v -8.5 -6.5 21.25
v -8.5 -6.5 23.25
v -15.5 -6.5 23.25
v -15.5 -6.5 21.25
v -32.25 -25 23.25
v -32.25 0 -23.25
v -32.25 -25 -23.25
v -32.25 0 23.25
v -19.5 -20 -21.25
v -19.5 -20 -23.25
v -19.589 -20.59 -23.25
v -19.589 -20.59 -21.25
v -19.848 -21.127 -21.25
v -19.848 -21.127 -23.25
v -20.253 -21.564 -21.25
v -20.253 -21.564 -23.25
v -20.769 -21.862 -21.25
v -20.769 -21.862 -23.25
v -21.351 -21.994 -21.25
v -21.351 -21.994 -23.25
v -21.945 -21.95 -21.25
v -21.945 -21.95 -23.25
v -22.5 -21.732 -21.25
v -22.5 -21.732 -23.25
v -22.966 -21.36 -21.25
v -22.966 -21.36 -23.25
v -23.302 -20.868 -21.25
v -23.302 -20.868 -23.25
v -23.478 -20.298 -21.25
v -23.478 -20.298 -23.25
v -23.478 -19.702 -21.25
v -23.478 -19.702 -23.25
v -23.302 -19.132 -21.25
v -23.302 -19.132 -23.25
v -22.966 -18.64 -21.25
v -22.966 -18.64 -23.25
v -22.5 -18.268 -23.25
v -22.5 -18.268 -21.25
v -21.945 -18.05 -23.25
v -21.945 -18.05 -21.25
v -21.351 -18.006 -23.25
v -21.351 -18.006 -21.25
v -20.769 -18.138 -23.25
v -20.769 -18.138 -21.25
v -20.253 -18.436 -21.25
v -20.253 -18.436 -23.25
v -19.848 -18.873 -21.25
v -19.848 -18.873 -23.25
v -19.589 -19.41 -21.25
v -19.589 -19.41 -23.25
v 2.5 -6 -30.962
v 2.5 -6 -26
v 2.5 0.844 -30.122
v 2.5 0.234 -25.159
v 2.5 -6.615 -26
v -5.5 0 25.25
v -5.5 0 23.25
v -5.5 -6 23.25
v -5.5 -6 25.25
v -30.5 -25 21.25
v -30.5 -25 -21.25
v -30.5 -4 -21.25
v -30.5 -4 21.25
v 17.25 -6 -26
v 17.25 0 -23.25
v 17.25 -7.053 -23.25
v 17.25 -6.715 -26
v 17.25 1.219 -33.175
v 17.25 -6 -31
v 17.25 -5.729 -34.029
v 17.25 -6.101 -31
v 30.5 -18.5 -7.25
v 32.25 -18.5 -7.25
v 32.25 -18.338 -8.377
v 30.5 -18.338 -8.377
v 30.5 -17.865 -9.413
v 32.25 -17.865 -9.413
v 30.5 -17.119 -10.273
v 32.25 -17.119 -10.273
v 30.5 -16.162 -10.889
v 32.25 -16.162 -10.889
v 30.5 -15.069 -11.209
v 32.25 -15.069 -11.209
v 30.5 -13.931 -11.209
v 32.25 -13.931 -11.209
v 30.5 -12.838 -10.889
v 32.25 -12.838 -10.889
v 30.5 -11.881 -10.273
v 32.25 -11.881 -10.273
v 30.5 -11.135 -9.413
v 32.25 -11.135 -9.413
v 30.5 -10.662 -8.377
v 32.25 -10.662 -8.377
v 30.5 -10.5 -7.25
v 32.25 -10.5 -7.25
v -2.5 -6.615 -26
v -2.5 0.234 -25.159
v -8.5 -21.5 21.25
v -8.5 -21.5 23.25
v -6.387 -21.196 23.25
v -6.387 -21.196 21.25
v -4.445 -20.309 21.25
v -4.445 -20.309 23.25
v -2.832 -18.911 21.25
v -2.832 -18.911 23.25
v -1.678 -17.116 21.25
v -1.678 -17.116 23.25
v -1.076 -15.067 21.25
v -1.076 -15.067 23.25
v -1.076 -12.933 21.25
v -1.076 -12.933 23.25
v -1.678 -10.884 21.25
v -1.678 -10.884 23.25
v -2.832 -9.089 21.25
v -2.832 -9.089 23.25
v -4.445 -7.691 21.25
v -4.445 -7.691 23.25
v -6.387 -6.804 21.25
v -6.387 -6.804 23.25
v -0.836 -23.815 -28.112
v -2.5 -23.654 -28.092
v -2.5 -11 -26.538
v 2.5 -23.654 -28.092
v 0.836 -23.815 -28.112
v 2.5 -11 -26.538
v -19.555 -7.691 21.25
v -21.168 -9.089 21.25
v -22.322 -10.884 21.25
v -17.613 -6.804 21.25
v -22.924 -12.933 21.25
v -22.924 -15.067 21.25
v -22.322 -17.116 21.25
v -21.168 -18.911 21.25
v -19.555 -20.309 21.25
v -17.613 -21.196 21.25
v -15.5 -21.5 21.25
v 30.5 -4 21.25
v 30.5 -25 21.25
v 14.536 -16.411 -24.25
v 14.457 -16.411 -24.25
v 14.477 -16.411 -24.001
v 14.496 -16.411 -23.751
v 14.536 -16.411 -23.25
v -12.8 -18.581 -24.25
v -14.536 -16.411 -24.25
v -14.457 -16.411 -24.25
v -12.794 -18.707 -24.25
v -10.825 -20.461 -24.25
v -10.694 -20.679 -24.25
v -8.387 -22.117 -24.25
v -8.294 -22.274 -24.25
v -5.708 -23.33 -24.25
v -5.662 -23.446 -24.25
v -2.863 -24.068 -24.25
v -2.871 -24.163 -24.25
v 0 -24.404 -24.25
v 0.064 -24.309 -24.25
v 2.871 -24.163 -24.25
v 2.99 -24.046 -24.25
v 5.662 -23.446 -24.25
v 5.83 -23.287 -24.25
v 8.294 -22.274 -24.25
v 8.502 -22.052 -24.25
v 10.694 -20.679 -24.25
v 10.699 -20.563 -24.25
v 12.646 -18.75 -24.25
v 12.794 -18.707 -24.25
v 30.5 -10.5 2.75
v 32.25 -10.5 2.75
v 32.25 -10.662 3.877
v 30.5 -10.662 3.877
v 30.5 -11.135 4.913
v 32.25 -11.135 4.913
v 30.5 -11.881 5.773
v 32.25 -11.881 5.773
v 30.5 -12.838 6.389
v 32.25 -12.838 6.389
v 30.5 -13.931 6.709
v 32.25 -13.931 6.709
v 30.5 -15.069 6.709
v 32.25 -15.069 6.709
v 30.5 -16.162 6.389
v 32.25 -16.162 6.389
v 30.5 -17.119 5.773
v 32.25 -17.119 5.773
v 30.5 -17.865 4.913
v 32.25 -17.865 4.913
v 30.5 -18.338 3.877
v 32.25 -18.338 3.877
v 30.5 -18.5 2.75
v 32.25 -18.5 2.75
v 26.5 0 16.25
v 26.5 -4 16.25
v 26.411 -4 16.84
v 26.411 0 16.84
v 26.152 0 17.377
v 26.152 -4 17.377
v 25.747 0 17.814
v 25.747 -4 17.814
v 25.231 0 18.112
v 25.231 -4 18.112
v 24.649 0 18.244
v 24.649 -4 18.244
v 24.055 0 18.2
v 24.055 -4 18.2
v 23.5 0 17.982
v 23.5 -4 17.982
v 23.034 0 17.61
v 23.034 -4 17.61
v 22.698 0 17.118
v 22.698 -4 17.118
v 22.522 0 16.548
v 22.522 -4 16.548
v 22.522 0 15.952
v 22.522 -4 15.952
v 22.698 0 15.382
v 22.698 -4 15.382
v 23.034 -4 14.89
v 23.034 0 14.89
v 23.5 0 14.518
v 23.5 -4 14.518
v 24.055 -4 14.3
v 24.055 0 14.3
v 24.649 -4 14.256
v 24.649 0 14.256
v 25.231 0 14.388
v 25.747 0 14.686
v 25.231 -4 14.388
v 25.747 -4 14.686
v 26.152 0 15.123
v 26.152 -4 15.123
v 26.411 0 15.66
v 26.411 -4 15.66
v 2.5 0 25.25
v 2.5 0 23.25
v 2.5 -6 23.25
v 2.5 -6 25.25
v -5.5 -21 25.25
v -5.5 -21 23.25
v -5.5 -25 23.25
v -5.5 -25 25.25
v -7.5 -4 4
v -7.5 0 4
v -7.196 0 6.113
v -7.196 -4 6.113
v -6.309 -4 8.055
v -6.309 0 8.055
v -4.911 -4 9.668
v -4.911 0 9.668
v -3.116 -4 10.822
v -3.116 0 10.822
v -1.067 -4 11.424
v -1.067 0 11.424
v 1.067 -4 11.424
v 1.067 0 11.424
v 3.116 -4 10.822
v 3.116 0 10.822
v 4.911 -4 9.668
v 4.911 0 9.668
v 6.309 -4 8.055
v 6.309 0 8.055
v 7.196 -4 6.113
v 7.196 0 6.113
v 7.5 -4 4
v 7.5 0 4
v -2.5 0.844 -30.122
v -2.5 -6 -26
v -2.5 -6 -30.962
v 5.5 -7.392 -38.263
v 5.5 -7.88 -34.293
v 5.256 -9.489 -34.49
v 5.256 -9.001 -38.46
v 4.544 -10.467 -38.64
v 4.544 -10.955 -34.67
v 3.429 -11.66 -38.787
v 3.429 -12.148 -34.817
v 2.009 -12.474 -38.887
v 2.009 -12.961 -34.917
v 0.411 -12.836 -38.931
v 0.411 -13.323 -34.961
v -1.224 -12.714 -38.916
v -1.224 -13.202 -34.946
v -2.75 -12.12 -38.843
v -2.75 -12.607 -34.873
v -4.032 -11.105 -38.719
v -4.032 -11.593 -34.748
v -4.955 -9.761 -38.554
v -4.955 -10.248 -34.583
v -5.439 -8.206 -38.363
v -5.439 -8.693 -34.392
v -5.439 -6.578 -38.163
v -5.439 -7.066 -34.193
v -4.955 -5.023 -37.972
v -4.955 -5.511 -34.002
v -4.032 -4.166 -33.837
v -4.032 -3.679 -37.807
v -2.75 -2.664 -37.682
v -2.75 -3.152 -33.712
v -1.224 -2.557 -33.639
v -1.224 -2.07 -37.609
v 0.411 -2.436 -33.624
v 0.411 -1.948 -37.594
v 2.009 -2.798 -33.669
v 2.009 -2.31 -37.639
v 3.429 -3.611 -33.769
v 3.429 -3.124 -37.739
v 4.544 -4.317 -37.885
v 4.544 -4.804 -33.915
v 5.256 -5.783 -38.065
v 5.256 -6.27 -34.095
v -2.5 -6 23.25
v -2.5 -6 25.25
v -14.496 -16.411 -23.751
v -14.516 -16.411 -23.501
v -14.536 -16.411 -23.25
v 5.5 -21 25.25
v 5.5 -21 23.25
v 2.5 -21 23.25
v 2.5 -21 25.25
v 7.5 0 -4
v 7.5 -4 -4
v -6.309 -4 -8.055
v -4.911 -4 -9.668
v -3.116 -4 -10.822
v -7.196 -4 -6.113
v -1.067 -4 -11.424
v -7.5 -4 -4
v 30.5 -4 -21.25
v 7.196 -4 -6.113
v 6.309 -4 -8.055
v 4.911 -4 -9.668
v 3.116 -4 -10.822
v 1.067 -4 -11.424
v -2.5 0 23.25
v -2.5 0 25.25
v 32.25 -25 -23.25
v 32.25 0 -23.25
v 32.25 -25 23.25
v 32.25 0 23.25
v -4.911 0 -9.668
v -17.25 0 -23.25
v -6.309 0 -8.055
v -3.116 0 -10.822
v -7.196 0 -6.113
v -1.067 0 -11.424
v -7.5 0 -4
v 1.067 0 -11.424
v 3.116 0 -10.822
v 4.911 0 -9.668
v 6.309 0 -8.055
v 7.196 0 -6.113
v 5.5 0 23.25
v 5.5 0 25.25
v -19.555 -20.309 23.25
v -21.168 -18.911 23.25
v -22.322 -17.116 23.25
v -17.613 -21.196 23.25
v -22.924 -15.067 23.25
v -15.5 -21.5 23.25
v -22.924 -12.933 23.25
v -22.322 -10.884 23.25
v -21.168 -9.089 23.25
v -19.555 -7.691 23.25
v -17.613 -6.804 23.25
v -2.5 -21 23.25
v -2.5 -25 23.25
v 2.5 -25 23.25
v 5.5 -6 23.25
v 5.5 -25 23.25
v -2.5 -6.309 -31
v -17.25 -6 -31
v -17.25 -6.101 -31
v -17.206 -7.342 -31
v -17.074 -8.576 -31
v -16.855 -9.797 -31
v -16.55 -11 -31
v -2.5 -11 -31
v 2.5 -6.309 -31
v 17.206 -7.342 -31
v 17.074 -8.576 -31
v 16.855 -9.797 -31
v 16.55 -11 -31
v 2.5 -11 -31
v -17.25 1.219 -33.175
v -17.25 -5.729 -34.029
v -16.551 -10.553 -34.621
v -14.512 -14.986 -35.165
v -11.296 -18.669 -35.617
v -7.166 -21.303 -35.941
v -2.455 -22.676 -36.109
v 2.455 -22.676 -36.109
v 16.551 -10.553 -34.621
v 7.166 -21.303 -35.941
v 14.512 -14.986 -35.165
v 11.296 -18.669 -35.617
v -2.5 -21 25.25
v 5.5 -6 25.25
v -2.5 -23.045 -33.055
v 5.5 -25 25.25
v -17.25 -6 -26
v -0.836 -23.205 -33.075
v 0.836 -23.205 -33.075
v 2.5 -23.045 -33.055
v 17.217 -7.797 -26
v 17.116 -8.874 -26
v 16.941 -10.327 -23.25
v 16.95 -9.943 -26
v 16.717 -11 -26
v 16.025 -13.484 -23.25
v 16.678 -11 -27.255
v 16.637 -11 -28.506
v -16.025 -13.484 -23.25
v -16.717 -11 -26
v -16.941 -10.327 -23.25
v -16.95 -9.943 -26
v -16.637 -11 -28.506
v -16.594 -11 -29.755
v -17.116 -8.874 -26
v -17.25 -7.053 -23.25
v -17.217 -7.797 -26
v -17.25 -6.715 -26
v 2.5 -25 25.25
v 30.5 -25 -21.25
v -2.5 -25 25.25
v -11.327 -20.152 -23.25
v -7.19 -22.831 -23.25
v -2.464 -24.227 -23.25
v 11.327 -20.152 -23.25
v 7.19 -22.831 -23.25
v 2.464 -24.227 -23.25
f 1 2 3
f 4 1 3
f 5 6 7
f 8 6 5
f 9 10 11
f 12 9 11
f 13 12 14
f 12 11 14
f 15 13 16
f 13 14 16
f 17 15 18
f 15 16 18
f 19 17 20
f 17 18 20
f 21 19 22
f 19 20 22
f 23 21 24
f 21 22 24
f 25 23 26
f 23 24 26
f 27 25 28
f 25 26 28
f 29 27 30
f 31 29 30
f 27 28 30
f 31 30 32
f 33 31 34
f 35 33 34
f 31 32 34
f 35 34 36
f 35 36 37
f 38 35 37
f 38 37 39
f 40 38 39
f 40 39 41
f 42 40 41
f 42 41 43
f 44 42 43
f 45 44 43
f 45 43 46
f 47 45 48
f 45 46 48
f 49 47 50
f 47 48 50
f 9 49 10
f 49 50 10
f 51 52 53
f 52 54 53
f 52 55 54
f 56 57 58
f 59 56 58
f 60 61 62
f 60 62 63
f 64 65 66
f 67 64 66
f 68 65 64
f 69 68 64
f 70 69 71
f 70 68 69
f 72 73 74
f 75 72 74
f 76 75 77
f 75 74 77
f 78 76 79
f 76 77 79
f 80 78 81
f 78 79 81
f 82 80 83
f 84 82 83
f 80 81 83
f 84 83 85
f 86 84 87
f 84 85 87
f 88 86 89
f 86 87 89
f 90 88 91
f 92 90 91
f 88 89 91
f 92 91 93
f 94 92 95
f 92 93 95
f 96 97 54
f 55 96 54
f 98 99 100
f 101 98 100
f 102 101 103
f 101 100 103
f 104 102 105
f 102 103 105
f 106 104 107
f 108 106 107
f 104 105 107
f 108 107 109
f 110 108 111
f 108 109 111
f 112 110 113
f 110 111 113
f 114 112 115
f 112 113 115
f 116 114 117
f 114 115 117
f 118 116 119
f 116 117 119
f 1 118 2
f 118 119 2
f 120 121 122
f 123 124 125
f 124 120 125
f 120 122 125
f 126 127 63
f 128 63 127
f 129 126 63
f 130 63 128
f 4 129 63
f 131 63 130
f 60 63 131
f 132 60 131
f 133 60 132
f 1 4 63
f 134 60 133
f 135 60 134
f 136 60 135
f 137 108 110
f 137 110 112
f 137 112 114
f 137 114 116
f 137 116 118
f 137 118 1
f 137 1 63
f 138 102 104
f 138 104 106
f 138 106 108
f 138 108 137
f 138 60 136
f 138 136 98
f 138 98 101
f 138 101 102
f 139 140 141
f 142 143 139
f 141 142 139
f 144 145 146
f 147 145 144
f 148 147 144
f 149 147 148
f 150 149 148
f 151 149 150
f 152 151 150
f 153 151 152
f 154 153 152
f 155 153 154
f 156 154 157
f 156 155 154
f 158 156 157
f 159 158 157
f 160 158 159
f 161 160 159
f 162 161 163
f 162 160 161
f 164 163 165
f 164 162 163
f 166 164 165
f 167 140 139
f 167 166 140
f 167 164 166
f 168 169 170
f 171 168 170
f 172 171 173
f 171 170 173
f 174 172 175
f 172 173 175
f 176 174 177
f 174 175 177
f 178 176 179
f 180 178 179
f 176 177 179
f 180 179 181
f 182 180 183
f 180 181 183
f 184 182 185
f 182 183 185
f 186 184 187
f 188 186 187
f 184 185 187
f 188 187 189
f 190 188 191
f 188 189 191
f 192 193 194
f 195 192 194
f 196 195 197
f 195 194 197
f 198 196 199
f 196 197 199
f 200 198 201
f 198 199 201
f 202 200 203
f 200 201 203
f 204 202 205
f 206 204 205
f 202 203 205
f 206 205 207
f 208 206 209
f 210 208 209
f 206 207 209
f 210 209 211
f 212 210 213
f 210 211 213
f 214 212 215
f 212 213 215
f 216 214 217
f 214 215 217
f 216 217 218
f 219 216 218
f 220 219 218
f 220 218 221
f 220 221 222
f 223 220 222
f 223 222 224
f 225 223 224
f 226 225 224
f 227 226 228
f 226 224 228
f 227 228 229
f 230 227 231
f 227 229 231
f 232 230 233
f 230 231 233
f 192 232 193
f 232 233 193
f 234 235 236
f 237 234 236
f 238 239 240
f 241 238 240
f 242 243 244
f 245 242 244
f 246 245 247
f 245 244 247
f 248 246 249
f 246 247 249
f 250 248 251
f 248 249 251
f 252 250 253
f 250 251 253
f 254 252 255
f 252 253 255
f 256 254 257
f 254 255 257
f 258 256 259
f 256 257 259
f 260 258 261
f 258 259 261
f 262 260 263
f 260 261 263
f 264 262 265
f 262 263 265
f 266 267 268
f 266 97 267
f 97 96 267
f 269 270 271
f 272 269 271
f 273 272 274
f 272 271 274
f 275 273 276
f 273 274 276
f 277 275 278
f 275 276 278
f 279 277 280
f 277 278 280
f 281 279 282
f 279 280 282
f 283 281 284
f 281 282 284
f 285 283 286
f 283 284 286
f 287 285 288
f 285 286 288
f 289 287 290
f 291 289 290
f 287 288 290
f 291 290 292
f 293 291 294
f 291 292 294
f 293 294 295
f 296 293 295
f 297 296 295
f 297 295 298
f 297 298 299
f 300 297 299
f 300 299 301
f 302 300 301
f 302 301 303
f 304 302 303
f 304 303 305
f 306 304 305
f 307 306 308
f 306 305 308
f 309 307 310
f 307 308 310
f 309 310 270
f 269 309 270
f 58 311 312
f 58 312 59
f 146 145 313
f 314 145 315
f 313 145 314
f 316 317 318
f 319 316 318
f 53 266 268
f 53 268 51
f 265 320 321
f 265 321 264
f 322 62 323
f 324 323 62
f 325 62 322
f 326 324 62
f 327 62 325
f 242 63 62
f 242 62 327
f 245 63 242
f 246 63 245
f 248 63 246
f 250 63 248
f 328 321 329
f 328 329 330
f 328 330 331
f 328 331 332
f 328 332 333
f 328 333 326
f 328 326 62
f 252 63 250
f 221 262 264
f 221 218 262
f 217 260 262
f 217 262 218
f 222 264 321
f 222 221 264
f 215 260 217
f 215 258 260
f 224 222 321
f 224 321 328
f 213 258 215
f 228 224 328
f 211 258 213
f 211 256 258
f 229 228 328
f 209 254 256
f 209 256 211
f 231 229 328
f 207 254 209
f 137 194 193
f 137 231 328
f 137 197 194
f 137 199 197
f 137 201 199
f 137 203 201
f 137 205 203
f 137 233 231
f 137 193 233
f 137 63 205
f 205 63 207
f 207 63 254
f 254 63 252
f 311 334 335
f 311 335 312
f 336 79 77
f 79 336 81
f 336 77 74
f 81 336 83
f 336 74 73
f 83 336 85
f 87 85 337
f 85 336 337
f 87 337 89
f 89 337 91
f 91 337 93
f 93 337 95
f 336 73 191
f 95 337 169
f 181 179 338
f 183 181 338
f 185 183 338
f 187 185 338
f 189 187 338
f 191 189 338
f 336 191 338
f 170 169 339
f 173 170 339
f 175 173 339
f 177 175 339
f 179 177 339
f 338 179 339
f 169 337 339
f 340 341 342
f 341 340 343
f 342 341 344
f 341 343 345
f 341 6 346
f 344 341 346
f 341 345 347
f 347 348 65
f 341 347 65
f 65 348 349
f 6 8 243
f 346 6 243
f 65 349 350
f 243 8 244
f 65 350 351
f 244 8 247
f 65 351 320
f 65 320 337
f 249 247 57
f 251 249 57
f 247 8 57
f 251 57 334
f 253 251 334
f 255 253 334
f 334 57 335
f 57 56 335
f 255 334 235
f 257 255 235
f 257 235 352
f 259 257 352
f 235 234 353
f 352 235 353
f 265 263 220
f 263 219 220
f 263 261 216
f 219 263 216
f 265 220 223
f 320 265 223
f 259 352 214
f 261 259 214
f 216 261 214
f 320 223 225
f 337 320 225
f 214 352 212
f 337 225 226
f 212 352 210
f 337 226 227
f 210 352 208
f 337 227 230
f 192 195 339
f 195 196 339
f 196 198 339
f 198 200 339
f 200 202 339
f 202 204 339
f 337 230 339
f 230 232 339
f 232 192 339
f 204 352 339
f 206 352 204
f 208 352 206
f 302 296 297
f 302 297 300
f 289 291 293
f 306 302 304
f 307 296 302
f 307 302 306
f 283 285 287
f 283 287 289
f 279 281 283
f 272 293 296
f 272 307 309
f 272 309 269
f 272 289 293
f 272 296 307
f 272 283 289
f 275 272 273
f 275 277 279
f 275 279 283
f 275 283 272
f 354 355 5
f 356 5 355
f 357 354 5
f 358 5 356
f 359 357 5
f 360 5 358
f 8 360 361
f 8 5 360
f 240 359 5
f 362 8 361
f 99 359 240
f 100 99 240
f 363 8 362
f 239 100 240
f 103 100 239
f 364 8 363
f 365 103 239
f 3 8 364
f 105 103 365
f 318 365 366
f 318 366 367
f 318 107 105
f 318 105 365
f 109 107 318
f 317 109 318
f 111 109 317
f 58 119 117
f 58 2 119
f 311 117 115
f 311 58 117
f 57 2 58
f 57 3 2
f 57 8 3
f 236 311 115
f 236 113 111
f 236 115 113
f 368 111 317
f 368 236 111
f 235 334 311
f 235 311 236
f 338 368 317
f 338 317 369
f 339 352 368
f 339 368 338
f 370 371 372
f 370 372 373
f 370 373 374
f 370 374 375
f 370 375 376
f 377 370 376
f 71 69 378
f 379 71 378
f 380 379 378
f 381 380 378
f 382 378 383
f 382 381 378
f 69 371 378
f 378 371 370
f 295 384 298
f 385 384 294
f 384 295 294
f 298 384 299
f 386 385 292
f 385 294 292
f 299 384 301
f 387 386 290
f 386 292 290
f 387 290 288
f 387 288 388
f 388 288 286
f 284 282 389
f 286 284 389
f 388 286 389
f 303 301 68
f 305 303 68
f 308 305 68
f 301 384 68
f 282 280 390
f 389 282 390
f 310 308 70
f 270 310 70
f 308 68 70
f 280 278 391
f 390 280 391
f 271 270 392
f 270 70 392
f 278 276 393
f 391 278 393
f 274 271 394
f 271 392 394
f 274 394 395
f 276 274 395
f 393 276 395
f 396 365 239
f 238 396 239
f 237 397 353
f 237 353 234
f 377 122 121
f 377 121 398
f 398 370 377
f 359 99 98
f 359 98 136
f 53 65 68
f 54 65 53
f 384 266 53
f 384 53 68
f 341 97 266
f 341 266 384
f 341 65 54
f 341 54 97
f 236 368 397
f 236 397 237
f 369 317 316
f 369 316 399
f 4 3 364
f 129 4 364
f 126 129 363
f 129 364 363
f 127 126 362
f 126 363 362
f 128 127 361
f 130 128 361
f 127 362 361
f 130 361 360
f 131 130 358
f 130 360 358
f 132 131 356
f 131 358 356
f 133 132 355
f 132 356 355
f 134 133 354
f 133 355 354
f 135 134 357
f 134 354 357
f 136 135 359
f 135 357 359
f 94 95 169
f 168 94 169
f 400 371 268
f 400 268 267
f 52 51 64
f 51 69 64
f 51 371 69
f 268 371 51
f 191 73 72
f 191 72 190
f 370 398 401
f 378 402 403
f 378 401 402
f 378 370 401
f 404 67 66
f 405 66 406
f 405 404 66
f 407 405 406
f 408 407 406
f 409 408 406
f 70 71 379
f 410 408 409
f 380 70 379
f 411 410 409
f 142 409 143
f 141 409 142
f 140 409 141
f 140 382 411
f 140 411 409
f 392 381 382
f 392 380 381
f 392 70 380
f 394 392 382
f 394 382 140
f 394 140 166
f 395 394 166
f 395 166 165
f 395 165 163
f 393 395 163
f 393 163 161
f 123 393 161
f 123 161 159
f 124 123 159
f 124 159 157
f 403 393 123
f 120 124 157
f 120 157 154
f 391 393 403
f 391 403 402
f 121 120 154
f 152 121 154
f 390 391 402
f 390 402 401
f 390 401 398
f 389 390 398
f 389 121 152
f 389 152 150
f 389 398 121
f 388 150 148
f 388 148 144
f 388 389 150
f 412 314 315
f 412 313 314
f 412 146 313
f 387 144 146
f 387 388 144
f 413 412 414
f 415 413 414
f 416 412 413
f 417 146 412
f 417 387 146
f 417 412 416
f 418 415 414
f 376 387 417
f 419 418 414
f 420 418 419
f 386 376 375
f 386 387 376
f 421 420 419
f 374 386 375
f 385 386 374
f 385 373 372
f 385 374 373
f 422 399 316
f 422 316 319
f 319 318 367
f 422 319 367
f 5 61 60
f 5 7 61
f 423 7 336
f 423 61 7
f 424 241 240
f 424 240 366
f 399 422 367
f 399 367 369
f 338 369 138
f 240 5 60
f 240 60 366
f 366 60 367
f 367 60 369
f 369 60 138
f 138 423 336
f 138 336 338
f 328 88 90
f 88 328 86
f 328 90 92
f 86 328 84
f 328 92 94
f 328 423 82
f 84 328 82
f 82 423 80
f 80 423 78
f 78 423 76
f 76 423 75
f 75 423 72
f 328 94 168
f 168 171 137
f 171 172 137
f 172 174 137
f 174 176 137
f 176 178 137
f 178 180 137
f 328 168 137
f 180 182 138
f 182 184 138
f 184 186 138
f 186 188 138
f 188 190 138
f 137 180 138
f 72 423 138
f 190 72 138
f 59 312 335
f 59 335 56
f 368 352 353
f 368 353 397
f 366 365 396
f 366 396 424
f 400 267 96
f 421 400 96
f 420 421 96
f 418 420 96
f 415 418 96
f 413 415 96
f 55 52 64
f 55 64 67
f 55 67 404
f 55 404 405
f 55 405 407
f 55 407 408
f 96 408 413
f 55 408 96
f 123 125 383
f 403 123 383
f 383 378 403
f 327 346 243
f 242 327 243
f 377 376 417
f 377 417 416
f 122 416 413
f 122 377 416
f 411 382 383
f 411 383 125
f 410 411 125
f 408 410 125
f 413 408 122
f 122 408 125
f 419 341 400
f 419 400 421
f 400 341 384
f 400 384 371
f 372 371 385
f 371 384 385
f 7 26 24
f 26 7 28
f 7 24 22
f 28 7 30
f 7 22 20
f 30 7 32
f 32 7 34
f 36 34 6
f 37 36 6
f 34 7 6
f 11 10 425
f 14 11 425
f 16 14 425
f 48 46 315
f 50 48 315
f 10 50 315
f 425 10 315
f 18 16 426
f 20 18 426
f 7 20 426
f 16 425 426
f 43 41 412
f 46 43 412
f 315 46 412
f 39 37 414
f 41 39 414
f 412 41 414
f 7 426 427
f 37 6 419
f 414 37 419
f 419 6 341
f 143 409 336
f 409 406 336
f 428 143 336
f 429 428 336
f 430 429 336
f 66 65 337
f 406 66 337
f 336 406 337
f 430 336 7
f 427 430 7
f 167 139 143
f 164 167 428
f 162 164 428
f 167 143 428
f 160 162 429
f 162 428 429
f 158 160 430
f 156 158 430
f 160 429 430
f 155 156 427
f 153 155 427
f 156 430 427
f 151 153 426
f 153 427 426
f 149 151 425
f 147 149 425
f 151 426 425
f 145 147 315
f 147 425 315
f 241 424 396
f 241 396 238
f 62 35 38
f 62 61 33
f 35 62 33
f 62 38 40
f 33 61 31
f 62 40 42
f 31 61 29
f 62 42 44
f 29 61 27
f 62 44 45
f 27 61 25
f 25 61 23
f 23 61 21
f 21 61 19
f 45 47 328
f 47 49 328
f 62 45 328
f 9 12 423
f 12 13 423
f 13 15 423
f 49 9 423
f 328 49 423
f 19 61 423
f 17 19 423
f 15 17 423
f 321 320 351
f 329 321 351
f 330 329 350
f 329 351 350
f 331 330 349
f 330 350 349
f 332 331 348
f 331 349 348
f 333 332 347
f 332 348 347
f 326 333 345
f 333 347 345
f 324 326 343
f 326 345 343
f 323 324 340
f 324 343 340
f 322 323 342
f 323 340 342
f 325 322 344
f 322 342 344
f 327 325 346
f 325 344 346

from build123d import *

# Parameters (mm, degrees)
SKETCH_W          = 64.5
SKETCH_H          = 46.5
PAD_DEPTH         = 25
SKETCH001_W       = 61
SKETCH001_H       = 42.5
POCKET_DEPTH      = 21
SKETCH002_R       = 2
POCKET001_DEPTH   = 4
POCKET002_DEPTH   = 2
POCKET003_DEPTH   = 2
SKETCH005_R       = 2
POCKET004_DEPTH   = 2
PAD001_DEPTH      = 10
PAD001_DEPTH_BACK = 2
PAD002_DEPTH      = 1
SKETCH008_R       = 5.5
PAD003_DEPTH      = 4
SKETCH009_W       = 5
SKETCH009_H       = 5
POCKET005_DEPTH   = 49.501
SKETCH010_W       = 5
SKETCH010_H       = 5
POCKET006_DEPTH   = 26.7259364864
SKETCH011_W       = 3
SKETCH011_H       = 6
SKETCH011_H_2     = 4
PAD004_DEPTH      = 2
POCKET007_DEPTH   = 5


with BuildPart() as part:
    # Sketch → Pad (new body)
    with BuildSketch(Plane.XZ):
        Rectangle(SKETCH_W, SKETCH_H)
    extrude(amount=PAD_DEPTH)

    # Sketch001 (on Face6 of Pad) → Pocket (cut)
    with BuildSketch(Plane.XZ.offset(25)):
        Rectangle(SKETCH001_W, SKETCH001_H)
    extrude(amount=-POCKET_DEPTH, mode=Mode.SUBTRACT)

    # Sketch002 (on Face11 of Pocket) → Pocket001 (cut)
    with BuildSketch(Plane.XZ.offset(4)):
        with Locations((24.5, 16.25)):
            Circle(SKETCH002_R)
    extrude(amount=-POCKET001_DEPTH, mode=Mode.SUBTRACT)

    # Sketch003 (on Face3 of Pocket001) → Pocket002 (cut)
    with BuildSketch(Plane(origin=(32.25, 0, 0), x_dir=(0, 0, 1), z_dir=(1, 0, 0))):
        with BuildLine():
            ThreePointArc((-7.25, 18.5), (-11.25, 14.5), (-7.25, 10.5))
            Line((-7.25, 10.5), (2.75, 10.5))
            ThreePointArc((2.75, 10.5), (6.75, 14.5), (2.75, 18.5))
            Line((-7.25, 18.5), (2.75, 18.5))
        make_face()
    extrude(amount=-POCKET002_DEPTH, mode=Mode.SUBTRACT)

    # Sketch004 (on Face1 of Pocket002) → Pocket003 (cut)
    with BuildSketch(Plane(origin=(0, 0, 23.25), x_dir=(-1, 0, 0), z_dir=(0, 0, 1))):
        with BuildLine():
            ThreePointArc((8.5, 21.5), (1, 14), (8.5, 6.5))
            Line((8.5, 6.5), (15.5, 6.5))
            ThreePointArc((15.5, 6.5), (23, 14), (15.5, 21.5))
            Line((8.5, 21.5), (15.5, 21.5))
        make_face()
    extrude(amount=-POCKET003_DEPTH, mode=Mode.SUBTRACT)

    # Sketch005 (on Face10 of Pocket003) → Pocket004 (cut)
    with BuildSketch(Plane(origin=(0, 0, -23.25), x_dir=(1, 0, 0), z_dir=(0, 0, -1))):
        with Locations((-21.5, 20)):
            Circle(SKETCH005_R)
    extrude(amount=-POCKET004_DEPTH, mode=Mode.SUBTRACT)

    # Sketch006 (on DatumPlane) → Pad001 (join, two sides)
    with BuildSketch(Plane(origin=(32.25, 0, -23.25), x_dir=(0, 0.9925461516, 0.1218693434), z_dir=(0, 0.1218693434, -0.9925461516))) as pad001_sk:
        with BuildLine():
            Line((0, -15), (0, -49.5))
            Line((0, -49.5), (-7, -49.5))
            ThreePointArc((-7, -15), (-24.25, -32.25), (-7, -49.5))
            Line((0, -15), (-7, -15))
        make_face()
    extrude(amount=PAD001_DEPTH)
    extrude(pad001_sk.sketch, amount=-PAD001_DEPTH_BACK)

    # Sketch007 (on Face10 of Pad001) → Pad002 (join)
    with BuildSketch(Plane(origin=(0, 0, -23.25), x_dir=(1, 0, 0), z_dir=(0, 0, -1))):
        with BuildLine():
            ThreePointArc((14.5355662094, 16.4110180962), (0, 24.4043784957), (-14.5355662094, 16.4110180962))
            Line((-14.5355662094, 16.4110180962), (14.5355662094, 16.4110180962))
        make_face()
    extrude(amount=PAD002_DEPTH)

    # Sketch008 (on Face26 of Pad002) → Pad003 (join)
    with BuildSketch(Plane(origin=(0, 4.0310354704, -32.8301493344), x_dir=(1, 0, 0), z_dir=(0, 0.1218693434, -0.9925461516))):
        with Locations((0, 12)):
            Circle(SKETCH008_R)
    extrude(amount=PAD003_DEPTH)

    # Sketch009 (on Face21 of Pad003) → Pocket005 (cut, through all)
    with BuildSketch(Plane(origin=(17.25, 0, 0), x_dir=(0, 0, 1), z_dir=(1, 0, 0))):
        with Locations((-28.5, 8.5)):
            Rectangle(SKETCH009_W, SKETCH009_H)
    extrude(amount=-POCKET005_DEPTH, mode=Mode.SUBTRACT)

    # Sketch010 (on Face11 of Pocket005) → Pocket006 (cut, through all)
    with BuildSketch(Plane(origin=(0, -2.8123420363, -0.345312182), x_dir=(1, 0, 0), z_dir=(0, 0.9925461516, 0.1218693434))):
        with Locations((0, 27.5)):
            Rectangle(SKETCH010_W, SKETCH010_H)
    extrude(amount=-POCKET006_DEPTH, mode=Mode.SUBTRACT)

    # Sketch011 (on Face1 of Pocket006) → Pad004 (join)
    with BuildSketch(Plane(origin=(0, 0, 23.25), x_dir=(-1, 0, 0), z_dir=(0, 0, 1))):
        with Locations((-4, 3)):
            Rectangle(SKETCH011_W, SKETCH011_H)
        with Locations((4, 3)):
            Rectangle(SKETCH011_W, SKETCH011_H)
        with Locations((-4, 23)):
            Rectangle(SKETCH011_W, SKETCH011_H_2)
        with Locations((4, 23)):
            Rectangle(SKETCH011_W, SKETCH011_H_2)
    extrude(amount=PAD004_DEPTH)

    # Sketch012 (on Face2 of Pad004) → Pocket007 (cut)
    with BuildSketch(Plane(origin=(0, 0, 0), x_dir=(1, 0, 0), z_dir=(0, 1, 0))):
        with BuildLine():
            ThreePointArc((7.5, 4), (0, 11.5), (-7.5, 4))
            Line((-7.5, 4), (-7.5, -4))
            ThreePointArc((-7.5, -4), (0, -11.5), (7.5, -4))
            Line((7.5, 4), (7.5, -4))
        make_face()
    extrude(amount=-POCKET007_DEPTH, mode=Mode.SUBTRACT)


solid = part.part
